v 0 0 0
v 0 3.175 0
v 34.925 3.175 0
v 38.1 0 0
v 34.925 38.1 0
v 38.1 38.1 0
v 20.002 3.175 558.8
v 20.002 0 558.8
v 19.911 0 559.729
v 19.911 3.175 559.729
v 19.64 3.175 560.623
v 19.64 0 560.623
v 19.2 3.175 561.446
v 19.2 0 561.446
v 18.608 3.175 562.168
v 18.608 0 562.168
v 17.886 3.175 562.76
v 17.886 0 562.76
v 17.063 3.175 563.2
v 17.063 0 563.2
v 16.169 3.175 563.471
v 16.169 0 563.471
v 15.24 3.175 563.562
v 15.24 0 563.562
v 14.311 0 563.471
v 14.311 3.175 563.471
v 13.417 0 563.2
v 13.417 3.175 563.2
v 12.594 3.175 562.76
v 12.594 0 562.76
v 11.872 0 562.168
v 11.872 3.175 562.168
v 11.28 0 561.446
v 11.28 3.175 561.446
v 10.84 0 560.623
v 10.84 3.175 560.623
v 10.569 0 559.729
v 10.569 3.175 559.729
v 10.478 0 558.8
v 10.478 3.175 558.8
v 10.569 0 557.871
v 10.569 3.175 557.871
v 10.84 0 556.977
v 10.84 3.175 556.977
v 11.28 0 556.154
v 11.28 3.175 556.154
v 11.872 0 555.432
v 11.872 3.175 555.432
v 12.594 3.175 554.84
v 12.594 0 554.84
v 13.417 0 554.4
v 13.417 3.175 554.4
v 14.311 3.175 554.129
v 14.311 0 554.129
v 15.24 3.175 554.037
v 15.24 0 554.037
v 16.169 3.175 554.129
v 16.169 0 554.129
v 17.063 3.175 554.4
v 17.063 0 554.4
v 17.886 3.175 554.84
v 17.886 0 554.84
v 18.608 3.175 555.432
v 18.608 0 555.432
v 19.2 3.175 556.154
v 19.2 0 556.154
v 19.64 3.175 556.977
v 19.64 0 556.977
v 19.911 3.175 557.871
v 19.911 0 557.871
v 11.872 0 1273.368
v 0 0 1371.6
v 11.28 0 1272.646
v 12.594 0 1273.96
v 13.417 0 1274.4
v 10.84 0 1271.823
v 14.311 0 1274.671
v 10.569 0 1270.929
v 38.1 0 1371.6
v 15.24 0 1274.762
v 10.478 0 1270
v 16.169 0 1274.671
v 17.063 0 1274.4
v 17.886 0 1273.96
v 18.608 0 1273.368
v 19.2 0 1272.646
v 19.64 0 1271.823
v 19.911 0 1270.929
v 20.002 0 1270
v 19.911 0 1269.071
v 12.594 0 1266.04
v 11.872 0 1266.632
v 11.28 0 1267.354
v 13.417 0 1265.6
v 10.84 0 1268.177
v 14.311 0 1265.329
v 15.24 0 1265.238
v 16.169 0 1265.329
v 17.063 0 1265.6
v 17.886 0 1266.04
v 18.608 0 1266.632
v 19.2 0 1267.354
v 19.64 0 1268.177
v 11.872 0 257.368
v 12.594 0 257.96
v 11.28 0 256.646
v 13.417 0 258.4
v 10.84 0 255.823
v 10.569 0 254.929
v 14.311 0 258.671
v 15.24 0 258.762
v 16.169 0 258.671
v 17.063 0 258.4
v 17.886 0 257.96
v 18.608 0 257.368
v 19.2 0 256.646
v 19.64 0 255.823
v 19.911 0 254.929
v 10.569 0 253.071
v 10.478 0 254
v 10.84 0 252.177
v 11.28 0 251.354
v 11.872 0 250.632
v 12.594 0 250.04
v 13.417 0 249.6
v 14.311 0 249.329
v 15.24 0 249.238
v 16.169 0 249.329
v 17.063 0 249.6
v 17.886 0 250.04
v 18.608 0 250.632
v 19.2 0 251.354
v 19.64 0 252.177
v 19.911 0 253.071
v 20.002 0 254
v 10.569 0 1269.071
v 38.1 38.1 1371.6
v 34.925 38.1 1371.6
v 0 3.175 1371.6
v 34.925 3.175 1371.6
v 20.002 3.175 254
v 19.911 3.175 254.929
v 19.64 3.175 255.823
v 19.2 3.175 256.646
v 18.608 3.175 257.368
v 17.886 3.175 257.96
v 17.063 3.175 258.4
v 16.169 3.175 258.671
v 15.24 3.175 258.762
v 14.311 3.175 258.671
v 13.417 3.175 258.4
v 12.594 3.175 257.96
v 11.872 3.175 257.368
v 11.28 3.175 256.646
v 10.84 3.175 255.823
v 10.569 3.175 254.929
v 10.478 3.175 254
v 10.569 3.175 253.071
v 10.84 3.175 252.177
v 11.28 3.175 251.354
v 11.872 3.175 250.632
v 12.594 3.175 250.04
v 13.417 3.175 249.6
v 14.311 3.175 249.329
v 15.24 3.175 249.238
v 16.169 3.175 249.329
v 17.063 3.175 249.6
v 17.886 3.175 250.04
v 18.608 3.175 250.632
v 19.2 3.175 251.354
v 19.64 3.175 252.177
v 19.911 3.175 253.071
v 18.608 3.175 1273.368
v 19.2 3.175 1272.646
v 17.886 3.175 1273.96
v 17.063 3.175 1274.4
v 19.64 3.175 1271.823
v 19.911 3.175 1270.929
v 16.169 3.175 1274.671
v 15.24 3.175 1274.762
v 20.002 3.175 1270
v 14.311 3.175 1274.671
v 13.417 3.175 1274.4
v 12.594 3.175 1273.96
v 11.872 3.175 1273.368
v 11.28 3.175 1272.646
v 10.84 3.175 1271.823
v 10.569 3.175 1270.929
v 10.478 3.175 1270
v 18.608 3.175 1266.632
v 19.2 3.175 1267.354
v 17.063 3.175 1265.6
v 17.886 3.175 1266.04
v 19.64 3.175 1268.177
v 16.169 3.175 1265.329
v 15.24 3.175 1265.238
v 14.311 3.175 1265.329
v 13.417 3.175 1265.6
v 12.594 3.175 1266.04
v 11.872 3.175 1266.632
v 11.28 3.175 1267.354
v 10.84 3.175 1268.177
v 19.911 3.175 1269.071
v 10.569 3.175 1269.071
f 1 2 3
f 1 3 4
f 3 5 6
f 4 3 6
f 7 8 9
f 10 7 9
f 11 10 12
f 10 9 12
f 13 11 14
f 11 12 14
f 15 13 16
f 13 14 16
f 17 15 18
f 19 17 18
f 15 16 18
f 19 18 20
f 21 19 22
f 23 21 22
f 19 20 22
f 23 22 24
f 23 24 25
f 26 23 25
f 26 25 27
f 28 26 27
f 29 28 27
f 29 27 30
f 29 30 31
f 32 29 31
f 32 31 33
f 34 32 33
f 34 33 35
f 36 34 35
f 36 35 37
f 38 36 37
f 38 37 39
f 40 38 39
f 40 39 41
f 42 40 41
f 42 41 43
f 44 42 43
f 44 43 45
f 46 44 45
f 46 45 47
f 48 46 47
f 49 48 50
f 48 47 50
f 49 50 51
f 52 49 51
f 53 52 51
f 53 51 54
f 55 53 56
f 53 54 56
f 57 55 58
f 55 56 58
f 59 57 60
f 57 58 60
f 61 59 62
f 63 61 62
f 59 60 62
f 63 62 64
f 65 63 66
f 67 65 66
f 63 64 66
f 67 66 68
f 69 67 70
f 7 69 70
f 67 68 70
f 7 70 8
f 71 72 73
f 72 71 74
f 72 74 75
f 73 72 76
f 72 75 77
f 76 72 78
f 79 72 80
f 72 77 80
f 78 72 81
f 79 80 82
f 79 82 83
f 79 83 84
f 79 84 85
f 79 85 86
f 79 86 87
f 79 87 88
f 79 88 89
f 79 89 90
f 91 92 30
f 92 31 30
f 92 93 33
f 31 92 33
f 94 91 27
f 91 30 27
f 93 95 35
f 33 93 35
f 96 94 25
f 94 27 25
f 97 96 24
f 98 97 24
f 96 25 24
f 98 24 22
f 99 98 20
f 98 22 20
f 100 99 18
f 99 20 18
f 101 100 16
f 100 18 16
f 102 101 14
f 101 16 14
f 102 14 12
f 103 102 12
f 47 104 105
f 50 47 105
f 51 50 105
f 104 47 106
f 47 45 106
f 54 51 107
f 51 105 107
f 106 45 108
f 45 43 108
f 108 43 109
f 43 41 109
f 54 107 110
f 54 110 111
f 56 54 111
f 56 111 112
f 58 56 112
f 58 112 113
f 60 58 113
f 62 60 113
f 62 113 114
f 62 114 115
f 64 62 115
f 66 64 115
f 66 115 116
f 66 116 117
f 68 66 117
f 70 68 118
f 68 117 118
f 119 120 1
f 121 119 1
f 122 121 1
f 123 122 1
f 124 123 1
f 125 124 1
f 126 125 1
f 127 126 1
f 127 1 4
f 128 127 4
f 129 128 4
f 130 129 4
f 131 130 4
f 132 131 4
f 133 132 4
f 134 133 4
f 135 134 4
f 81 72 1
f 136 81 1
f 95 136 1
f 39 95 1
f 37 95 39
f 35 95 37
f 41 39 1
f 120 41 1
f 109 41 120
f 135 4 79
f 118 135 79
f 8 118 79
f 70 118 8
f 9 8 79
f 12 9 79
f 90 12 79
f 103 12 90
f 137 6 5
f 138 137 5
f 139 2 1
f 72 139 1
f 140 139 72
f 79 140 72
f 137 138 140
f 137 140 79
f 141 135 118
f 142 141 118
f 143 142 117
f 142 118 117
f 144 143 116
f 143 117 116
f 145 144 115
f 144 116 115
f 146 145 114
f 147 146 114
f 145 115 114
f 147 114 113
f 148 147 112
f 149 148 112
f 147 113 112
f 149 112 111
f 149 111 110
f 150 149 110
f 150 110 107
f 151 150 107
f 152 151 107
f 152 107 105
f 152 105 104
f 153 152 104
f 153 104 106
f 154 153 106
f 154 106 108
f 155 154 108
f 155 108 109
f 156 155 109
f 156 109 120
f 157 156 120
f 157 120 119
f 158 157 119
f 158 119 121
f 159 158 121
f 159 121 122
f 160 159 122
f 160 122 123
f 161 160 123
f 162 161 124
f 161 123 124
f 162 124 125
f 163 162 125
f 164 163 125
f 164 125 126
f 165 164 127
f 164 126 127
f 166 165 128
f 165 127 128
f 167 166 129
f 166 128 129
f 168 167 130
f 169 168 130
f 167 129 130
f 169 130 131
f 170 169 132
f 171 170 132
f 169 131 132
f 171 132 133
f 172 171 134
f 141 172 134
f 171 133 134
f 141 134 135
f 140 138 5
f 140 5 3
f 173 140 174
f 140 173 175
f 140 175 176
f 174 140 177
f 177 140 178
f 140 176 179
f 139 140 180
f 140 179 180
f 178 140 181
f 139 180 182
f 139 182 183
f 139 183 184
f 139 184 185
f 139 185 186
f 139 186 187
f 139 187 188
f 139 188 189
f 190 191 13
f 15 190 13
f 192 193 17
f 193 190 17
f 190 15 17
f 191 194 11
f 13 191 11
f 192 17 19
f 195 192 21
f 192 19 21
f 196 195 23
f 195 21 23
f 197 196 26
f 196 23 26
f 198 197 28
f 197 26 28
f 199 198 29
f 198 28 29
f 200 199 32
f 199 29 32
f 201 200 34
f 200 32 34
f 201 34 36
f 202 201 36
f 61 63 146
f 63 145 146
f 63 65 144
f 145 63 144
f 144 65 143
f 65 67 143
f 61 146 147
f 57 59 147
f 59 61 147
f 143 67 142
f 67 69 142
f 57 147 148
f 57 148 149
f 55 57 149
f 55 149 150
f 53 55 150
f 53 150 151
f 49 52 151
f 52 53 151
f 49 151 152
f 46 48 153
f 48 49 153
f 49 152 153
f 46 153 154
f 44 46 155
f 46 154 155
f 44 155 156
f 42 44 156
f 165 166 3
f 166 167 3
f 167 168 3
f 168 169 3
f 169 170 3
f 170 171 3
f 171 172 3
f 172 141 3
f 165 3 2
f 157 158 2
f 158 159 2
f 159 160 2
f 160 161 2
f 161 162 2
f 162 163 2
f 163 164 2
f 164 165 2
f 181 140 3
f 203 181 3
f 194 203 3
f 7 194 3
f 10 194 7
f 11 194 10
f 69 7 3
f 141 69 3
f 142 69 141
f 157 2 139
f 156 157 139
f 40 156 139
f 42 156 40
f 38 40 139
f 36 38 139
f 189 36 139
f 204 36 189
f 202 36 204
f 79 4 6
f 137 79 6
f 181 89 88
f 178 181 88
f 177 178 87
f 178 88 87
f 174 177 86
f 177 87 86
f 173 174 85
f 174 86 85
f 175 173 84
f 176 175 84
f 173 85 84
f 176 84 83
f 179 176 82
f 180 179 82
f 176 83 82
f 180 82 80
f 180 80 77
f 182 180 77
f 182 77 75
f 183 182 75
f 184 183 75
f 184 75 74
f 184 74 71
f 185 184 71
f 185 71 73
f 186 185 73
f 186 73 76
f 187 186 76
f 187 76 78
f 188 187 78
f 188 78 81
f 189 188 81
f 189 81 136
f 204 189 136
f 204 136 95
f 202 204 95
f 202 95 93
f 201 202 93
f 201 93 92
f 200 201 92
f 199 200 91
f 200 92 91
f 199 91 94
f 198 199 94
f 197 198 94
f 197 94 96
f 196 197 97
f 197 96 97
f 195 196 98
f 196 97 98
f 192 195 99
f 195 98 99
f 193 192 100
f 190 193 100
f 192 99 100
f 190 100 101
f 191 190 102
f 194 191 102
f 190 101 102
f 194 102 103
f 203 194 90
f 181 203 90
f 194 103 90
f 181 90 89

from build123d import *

# Parameters (mm, degrees)
F1_DEPTH = 1371.6
F2_R     = 4.7625
F3_DEPTH = 38.101


with BuildPart() as f1:
    # F0 (on Top) → F1 (new body)
    with BuildSketch(Plane.XY):
        Polygon((0, 3.175), (0, 0), (38.1, 0), (38.1, 38.1), (34.925, 38.1), (34.925, 3.175), align=None)
    extrude(amount=F1_DEPTH)

    # F2 (on face) → F3 (cut, through all)
    with BuildSketch(Plane.XZ):
        with Locations((15.24, 254)):
            Circle(F2_R)
        with Locations((15.24, 558.8)):
            Circle(F2_R)
        with Locations((15.24, 1270)):
            Circle(F2_R)
    extrude(amount=-F3_DEPTH, mode=Mode.SUBTRACT)


solid = f1.part
